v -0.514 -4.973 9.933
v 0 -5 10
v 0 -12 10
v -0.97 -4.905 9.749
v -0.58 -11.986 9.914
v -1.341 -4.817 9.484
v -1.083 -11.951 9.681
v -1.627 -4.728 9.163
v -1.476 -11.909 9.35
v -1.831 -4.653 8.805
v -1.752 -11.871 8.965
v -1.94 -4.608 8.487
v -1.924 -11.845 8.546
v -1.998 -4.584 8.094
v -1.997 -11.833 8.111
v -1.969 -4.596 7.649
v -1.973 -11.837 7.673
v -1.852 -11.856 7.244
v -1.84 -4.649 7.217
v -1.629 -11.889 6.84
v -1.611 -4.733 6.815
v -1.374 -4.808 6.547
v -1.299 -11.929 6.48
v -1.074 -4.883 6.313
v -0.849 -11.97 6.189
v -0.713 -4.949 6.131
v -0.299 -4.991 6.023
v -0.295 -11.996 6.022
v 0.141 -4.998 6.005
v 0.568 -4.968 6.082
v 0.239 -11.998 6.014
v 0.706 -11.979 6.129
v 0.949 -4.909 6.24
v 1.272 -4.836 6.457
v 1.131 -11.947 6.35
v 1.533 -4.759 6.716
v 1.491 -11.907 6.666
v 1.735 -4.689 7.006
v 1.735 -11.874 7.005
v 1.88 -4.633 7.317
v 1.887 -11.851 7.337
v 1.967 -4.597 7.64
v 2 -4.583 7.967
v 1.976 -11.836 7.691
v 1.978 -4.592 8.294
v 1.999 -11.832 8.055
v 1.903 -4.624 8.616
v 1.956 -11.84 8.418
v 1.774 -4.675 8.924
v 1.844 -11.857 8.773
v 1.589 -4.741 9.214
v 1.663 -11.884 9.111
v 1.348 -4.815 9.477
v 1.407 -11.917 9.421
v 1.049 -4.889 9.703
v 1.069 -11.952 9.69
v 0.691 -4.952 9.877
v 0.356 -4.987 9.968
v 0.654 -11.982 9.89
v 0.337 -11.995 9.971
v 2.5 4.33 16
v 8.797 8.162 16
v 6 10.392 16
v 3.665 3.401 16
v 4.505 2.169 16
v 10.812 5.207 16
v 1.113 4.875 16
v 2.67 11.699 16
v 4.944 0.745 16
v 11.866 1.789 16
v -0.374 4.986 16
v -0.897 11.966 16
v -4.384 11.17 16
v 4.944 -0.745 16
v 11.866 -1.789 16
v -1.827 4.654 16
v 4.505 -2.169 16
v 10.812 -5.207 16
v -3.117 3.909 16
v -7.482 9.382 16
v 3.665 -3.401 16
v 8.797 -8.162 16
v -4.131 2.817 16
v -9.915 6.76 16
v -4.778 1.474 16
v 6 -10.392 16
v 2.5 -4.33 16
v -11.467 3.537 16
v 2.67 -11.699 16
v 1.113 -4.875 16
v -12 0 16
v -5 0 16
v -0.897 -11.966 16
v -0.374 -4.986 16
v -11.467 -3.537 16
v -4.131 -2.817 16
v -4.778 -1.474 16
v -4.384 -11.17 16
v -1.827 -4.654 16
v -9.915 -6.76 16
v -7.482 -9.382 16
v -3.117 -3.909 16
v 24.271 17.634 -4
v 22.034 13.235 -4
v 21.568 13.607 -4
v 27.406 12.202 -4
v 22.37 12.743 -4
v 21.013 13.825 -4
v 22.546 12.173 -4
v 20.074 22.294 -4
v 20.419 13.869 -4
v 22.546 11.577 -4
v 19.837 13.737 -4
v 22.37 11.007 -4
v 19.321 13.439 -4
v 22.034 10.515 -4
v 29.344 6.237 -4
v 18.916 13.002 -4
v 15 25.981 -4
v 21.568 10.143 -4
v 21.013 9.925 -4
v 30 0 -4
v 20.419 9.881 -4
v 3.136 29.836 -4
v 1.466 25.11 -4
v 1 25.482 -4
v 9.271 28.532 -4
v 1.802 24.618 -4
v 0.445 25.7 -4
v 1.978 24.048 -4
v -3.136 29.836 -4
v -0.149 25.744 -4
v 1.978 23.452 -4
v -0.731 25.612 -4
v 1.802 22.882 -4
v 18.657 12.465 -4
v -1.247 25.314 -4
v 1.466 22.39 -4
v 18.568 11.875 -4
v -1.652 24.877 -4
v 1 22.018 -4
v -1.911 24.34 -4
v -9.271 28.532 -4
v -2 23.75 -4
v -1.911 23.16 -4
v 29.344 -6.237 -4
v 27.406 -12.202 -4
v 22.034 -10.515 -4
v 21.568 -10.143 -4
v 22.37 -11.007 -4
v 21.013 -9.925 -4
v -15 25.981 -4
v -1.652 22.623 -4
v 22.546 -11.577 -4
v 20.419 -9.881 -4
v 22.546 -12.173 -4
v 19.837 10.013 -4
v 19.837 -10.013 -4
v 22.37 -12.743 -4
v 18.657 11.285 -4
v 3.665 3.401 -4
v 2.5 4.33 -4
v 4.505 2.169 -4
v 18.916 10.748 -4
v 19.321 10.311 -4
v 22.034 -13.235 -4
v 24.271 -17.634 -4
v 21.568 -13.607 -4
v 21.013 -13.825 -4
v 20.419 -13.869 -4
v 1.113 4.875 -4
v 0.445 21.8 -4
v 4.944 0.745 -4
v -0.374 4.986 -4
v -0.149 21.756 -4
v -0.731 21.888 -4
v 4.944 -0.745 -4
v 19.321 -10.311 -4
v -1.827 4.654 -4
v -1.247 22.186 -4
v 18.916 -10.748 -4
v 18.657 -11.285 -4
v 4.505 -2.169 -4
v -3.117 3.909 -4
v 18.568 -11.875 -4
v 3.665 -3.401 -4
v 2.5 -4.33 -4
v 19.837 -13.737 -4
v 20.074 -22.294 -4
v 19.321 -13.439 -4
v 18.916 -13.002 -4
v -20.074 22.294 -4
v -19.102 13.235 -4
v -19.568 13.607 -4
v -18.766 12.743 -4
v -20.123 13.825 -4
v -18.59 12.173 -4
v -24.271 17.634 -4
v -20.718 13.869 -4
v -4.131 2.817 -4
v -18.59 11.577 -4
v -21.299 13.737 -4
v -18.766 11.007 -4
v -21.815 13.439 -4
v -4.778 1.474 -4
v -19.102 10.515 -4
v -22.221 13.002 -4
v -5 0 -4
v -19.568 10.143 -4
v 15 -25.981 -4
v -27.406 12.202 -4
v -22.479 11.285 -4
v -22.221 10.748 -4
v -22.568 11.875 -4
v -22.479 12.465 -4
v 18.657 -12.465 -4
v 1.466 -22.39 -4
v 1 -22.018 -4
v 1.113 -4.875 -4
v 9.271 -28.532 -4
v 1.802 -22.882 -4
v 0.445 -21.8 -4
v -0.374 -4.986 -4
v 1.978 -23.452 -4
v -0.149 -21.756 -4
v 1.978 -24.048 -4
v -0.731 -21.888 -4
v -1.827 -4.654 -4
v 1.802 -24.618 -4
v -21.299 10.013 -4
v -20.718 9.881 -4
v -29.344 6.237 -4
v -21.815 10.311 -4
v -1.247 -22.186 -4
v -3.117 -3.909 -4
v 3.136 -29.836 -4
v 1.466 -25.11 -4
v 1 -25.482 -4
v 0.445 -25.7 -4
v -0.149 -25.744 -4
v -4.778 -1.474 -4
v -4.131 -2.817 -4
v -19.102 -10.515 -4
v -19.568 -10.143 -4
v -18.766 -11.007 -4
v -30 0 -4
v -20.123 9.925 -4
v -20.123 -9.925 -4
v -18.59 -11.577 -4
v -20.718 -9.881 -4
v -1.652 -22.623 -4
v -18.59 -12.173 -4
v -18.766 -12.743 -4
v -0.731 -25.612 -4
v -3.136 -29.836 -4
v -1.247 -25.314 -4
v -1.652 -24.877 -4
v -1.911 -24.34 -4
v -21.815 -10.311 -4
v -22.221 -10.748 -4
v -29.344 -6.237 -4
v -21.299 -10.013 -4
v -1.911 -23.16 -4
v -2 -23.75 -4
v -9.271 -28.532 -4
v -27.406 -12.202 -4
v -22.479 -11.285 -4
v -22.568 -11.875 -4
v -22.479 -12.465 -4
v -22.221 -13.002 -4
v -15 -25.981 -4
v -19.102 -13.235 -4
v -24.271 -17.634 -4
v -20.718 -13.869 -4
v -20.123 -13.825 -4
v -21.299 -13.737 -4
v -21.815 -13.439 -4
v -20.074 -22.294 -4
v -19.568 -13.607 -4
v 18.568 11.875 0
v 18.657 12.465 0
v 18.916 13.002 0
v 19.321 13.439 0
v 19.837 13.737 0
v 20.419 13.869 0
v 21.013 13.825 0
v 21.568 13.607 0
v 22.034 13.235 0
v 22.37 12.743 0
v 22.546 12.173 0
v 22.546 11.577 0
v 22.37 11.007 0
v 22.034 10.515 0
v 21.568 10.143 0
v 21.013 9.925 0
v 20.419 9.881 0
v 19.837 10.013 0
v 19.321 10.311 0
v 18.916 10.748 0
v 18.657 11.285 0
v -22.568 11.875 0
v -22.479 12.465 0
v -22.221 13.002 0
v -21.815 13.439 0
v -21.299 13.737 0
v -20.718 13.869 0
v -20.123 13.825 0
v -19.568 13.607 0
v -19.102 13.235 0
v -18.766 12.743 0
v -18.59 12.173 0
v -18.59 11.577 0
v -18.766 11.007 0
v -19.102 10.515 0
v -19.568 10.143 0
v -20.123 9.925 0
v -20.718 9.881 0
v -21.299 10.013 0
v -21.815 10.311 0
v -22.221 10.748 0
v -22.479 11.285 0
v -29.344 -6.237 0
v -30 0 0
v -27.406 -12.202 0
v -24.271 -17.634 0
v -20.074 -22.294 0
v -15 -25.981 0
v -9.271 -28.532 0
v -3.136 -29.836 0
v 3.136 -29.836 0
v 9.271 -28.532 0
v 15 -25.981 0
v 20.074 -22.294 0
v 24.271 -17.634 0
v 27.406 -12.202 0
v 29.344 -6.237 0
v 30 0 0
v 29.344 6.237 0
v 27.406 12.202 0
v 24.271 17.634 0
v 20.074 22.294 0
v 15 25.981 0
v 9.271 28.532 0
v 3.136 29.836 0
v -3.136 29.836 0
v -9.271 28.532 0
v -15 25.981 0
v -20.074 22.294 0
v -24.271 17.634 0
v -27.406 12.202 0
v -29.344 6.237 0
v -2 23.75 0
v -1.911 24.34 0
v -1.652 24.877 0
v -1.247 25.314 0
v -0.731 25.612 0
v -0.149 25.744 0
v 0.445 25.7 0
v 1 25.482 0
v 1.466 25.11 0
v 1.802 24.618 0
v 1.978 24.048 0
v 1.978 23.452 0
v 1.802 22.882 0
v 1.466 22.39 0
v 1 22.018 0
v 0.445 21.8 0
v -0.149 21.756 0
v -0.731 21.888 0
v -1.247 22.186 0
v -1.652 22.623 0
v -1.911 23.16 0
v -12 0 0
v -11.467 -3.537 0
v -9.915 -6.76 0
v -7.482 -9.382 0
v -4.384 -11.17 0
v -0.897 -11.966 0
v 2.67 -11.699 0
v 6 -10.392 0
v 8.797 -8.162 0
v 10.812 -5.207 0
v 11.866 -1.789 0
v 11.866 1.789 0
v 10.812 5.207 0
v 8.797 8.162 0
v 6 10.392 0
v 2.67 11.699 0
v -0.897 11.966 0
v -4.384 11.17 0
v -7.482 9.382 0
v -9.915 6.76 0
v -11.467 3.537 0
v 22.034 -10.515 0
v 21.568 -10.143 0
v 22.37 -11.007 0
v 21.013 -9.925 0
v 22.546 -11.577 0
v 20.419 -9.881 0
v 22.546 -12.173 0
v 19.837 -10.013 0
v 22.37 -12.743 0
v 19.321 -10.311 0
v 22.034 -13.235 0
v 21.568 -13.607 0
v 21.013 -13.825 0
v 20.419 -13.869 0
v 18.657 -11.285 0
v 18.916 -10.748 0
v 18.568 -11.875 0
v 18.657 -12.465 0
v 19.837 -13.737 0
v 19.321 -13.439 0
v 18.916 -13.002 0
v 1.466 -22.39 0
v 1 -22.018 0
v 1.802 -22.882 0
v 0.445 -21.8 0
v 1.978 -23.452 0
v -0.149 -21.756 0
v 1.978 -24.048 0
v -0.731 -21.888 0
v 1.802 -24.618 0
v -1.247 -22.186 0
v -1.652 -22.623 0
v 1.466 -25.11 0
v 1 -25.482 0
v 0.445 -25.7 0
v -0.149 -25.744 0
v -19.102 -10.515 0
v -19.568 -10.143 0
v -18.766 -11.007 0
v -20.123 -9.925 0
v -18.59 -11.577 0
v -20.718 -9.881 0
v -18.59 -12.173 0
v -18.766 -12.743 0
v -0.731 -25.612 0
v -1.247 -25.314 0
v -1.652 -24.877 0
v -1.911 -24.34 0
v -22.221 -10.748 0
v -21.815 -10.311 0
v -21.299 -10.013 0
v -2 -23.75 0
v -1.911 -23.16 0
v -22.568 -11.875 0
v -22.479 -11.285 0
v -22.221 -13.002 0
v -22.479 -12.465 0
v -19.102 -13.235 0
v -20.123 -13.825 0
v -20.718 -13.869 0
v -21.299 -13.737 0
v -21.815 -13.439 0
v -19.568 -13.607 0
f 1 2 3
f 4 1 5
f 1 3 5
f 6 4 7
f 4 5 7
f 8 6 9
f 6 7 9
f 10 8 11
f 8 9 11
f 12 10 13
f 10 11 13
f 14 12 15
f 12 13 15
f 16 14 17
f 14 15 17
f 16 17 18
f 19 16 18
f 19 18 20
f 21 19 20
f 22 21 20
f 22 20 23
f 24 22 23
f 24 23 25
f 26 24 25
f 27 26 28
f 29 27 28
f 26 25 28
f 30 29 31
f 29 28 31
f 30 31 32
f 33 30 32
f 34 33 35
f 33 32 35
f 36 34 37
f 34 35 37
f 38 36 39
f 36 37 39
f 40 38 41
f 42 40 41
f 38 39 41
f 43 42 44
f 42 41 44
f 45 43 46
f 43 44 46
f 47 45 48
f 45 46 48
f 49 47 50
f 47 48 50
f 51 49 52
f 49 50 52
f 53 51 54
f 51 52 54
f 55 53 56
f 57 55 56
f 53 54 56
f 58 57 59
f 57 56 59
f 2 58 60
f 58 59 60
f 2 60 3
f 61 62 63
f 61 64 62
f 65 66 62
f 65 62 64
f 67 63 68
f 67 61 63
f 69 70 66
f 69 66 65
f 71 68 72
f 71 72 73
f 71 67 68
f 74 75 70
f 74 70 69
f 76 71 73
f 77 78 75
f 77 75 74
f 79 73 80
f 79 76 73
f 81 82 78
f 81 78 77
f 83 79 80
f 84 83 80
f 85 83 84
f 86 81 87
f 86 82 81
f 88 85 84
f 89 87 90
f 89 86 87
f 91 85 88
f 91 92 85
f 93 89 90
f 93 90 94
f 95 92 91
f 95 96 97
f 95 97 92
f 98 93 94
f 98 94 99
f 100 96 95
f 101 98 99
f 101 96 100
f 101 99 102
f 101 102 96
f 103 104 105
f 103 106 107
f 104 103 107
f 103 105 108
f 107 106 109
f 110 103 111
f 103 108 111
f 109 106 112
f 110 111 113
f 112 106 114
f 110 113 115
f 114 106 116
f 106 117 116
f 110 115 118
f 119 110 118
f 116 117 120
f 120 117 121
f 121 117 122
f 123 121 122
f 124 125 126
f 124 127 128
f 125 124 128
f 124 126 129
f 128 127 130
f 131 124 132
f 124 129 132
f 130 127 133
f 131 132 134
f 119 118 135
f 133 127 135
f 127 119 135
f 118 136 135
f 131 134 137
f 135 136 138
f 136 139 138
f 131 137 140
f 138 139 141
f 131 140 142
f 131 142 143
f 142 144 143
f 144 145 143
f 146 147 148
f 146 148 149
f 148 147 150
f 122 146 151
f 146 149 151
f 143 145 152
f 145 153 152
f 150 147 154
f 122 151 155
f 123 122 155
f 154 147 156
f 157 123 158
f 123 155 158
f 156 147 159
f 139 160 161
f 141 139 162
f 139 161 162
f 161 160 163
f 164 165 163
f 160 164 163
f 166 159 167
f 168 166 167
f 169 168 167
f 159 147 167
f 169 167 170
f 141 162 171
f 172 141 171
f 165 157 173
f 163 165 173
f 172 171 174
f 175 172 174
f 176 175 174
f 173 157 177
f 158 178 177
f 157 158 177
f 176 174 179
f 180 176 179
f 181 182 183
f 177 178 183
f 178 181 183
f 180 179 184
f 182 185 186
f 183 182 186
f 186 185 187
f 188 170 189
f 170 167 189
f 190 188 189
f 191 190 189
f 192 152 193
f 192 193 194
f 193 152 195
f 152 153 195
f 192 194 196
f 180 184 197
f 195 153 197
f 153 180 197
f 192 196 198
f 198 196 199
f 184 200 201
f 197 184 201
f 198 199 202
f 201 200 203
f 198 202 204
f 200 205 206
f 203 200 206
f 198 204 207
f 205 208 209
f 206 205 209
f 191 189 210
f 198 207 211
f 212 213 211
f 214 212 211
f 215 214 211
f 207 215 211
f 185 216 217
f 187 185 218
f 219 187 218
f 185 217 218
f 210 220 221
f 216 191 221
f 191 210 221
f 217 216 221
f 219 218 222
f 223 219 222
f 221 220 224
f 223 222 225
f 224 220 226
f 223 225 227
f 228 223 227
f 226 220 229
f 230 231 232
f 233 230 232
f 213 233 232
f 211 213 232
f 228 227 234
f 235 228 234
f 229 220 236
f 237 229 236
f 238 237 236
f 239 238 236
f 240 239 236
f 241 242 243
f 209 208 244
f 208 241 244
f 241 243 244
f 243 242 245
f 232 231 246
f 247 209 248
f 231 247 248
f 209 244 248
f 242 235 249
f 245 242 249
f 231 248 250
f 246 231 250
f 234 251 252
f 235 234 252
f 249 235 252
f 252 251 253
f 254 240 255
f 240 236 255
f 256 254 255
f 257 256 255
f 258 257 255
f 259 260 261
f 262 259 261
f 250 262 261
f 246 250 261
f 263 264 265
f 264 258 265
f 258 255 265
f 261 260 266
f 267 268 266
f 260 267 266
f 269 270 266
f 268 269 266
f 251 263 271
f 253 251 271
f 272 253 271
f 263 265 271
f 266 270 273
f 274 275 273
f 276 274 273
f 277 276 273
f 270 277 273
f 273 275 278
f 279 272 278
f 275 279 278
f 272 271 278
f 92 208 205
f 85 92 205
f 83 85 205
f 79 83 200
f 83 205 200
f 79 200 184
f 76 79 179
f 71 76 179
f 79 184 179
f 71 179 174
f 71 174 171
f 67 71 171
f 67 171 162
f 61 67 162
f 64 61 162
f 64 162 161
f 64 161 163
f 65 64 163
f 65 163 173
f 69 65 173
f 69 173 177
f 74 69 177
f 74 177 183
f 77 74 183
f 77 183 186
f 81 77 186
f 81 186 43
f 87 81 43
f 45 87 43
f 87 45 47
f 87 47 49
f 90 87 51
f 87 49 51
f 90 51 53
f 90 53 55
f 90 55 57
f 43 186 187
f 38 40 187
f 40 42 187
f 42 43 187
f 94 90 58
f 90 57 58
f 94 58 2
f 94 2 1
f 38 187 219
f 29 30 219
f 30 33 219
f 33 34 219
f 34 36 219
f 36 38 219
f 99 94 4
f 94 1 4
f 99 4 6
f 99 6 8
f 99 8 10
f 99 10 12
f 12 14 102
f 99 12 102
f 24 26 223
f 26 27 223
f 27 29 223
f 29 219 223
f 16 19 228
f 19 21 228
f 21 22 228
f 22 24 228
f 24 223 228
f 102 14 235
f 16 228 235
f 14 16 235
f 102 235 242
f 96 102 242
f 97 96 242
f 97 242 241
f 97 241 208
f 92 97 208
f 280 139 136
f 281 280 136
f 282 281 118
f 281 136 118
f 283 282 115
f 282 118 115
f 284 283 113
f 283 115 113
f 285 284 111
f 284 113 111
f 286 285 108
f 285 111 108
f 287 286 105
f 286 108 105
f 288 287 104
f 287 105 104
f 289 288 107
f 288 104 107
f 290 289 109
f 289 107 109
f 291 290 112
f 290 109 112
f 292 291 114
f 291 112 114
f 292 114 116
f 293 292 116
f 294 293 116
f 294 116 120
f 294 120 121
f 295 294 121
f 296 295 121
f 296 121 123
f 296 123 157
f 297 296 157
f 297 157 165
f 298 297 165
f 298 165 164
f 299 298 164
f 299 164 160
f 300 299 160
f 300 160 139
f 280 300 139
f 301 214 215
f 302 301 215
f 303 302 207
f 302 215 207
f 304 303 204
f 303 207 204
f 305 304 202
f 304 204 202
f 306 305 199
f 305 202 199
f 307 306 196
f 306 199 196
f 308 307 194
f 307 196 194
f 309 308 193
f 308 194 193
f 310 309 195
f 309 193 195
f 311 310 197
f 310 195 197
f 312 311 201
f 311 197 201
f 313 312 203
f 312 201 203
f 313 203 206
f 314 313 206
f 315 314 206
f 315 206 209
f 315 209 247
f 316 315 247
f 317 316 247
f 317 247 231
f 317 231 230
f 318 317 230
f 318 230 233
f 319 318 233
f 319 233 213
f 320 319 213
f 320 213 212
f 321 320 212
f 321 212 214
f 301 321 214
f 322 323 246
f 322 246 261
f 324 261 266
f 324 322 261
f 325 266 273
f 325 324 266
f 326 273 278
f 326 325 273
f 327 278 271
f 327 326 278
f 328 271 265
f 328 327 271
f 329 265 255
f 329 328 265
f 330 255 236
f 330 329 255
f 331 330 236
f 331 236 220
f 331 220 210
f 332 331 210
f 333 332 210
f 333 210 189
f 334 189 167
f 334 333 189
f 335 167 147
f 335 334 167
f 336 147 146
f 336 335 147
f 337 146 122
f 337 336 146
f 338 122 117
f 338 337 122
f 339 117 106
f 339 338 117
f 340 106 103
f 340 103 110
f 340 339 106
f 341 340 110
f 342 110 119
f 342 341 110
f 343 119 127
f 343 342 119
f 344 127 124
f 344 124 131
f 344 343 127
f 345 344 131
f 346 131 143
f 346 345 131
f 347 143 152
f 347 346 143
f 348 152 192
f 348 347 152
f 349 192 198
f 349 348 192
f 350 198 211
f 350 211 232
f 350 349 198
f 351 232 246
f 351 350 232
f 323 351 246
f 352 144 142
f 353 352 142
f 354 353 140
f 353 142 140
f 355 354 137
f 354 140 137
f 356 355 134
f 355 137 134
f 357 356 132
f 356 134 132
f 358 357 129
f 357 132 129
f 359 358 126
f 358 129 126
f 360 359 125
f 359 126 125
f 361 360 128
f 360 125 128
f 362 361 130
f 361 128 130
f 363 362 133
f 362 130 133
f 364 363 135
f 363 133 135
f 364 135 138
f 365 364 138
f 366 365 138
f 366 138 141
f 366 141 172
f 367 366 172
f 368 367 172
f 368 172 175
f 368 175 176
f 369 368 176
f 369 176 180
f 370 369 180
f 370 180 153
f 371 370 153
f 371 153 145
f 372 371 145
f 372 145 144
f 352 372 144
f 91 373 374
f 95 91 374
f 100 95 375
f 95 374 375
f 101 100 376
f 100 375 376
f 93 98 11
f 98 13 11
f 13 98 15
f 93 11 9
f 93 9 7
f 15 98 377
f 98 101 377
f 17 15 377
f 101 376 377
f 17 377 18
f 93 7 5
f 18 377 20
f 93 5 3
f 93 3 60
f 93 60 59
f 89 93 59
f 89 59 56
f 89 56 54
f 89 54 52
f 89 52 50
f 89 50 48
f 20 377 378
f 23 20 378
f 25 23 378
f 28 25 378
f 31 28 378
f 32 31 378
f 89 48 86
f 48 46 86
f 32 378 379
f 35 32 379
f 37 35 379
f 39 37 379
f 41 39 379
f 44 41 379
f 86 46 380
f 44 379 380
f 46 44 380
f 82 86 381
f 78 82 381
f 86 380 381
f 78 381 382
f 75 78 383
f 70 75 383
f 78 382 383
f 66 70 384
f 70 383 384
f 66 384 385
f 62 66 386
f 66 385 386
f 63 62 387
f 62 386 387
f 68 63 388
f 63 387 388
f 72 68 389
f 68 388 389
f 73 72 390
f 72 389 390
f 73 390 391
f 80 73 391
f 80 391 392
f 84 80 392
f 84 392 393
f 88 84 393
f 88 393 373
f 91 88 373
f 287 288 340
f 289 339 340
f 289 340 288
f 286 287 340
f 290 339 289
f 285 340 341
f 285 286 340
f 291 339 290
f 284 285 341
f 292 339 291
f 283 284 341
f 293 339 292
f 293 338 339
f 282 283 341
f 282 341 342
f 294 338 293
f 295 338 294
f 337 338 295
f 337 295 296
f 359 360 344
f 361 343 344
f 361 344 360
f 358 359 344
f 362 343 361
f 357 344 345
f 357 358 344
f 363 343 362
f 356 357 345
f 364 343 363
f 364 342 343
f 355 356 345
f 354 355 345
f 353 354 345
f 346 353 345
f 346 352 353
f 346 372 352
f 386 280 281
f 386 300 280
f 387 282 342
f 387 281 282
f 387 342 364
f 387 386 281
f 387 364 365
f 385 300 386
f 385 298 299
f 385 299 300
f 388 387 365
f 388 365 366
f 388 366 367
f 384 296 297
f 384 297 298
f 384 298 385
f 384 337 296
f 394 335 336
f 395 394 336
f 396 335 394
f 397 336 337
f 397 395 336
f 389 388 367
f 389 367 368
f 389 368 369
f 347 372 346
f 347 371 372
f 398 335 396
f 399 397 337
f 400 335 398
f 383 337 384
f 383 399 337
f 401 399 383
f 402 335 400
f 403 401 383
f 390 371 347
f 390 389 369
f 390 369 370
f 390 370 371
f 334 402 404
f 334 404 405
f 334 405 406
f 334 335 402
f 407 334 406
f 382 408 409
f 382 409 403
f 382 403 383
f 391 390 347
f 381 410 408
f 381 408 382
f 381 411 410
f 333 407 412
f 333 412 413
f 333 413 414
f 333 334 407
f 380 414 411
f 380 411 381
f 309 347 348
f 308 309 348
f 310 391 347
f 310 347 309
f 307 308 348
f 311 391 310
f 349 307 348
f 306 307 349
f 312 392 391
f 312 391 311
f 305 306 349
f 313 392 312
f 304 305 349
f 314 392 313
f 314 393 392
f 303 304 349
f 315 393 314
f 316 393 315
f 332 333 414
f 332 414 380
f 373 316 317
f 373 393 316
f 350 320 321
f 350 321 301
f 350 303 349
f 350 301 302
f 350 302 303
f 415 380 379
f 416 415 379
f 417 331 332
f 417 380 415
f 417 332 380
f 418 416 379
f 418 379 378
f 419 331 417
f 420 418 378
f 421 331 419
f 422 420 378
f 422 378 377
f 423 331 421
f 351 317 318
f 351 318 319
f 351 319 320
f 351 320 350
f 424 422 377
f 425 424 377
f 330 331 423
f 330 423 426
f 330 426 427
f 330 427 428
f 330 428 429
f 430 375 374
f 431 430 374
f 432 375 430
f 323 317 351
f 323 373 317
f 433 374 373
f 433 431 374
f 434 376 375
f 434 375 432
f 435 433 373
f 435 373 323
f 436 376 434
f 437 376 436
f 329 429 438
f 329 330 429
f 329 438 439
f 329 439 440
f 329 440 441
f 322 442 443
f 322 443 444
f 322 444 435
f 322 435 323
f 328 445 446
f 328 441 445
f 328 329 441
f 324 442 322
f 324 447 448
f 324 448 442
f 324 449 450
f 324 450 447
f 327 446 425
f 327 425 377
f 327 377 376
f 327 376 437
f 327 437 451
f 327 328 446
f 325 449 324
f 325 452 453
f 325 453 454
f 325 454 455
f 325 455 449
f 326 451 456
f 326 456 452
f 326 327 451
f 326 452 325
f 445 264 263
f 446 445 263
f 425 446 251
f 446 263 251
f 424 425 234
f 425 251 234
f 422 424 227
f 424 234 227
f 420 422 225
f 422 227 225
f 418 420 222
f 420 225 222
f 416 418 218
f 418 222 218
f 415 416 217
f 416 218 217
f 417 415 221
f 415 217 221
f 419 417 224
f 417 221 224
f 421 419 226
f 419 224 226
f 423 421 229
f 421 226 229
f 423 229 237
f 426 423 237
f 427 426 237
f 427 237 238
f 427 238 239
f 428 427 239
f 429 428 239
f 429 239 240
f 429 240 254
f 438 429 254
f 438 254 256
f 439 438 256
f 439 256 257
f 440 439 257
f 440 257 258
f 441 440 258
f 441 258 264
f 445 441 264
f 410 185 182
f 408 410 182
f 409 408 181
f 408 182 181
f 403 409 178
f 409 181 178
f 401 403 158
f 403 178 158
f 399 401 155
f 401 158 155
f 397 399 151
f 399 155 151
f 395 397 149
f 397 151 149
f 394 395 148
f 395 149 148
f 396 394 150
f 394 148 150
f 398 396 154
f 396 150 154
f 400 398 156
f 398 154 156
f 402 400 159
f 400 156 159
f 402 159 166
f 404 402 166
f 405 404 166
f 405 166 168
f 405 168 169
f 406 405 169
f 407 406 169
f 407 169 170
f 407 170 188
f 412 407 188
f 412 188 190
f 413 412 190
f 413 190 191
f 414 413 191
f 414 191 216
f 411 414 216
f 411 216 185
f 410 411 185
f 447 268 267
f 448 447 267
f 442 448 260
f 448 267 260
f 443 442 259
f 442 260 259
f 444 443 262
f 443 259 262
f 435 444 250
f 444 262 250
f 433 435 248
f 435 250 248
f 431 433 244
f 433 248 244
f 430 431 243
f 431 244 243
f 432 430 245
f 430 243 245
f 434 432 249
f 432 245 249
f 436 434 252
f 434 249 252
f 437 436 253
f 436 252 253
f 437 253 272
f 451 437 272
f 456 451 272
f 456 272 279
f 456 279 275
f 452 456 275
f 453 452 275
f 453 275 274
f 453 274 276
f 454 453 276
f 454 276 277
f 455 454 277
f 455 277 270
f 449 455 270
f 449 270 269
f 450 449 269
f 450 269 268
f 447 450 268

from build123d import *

# Parameters (mm, degrees)
SKETCH1_R                  = 30
BOSS_EXTRUDE1_DEPTH        = 4
SKETCH2_R                  = 12
BOSS_EXTRUDE2_DEPTH        = 16
F_4_0_4_DIAMETER_HOLE1_D   = 4
F_10_0_10_DIAMETER_HOLE1_D = 10
SKETCH7_W                  = 2
SKETCH7_H                  = 24


with BuildPart() as part:
    # Sketch1 → Boss-Extrude1 (new body)
    with BuildSketch(Plane.XY):
        with Locations(Location((0, 0, 0), (0, 0, 180))):
            Circle(SKETCH1_R)
    extrude(amount=-BOSS_EXTRUDE1_DEPTH)

    # Sketch2 → Boss-Extrude2 (add)
    with BuildSketch(Plane.XY):
        with Locations(Location((0, 0, 0), (0, 0, 180))):
            Circle(SKETCH2_R)
    extrude(amount=BOSS_EXTRUDE2_DEPTH)

    # Ø4.0 (4) Diameter Hole1 (through all)
    with Locations(Plane.XY):
        with Locations((20.56810334, -11.875), (0, 23.75), (0, -23.75), (20.56810334, 11.875), (-20.56810334, 11.875), (-20.56810334, -11.875)):
            Hole(F_4_0_4_DIAMETER_HOLE1_D / 2)

    # Ø10.0 (10) Diameter Hole1 (through all)
    with Locations(Plane.XY.offset(16)):
        with Locations((0, 0)):
            Hole(F_10_0_10_DIAMETER_HOLE1_D / 2)

    # Sketch7 → Ø4.0 (4) Diameter Hole2 (revolve, cut)
    with BuildSketch(Plane(origin=(0, -4.582575695, 8), x_dir=(0, 0, 1), z_dir=(1, 0, 0))):
        with Locations((1, 12)):
            Rectangle(SKETCH7_W, SKETCH7_H)
    revolve(axis=Axis((0, 1.767424305, 8), (0, -1, 0)), mode=Mode.SUBTRACT)


solid = part.part
